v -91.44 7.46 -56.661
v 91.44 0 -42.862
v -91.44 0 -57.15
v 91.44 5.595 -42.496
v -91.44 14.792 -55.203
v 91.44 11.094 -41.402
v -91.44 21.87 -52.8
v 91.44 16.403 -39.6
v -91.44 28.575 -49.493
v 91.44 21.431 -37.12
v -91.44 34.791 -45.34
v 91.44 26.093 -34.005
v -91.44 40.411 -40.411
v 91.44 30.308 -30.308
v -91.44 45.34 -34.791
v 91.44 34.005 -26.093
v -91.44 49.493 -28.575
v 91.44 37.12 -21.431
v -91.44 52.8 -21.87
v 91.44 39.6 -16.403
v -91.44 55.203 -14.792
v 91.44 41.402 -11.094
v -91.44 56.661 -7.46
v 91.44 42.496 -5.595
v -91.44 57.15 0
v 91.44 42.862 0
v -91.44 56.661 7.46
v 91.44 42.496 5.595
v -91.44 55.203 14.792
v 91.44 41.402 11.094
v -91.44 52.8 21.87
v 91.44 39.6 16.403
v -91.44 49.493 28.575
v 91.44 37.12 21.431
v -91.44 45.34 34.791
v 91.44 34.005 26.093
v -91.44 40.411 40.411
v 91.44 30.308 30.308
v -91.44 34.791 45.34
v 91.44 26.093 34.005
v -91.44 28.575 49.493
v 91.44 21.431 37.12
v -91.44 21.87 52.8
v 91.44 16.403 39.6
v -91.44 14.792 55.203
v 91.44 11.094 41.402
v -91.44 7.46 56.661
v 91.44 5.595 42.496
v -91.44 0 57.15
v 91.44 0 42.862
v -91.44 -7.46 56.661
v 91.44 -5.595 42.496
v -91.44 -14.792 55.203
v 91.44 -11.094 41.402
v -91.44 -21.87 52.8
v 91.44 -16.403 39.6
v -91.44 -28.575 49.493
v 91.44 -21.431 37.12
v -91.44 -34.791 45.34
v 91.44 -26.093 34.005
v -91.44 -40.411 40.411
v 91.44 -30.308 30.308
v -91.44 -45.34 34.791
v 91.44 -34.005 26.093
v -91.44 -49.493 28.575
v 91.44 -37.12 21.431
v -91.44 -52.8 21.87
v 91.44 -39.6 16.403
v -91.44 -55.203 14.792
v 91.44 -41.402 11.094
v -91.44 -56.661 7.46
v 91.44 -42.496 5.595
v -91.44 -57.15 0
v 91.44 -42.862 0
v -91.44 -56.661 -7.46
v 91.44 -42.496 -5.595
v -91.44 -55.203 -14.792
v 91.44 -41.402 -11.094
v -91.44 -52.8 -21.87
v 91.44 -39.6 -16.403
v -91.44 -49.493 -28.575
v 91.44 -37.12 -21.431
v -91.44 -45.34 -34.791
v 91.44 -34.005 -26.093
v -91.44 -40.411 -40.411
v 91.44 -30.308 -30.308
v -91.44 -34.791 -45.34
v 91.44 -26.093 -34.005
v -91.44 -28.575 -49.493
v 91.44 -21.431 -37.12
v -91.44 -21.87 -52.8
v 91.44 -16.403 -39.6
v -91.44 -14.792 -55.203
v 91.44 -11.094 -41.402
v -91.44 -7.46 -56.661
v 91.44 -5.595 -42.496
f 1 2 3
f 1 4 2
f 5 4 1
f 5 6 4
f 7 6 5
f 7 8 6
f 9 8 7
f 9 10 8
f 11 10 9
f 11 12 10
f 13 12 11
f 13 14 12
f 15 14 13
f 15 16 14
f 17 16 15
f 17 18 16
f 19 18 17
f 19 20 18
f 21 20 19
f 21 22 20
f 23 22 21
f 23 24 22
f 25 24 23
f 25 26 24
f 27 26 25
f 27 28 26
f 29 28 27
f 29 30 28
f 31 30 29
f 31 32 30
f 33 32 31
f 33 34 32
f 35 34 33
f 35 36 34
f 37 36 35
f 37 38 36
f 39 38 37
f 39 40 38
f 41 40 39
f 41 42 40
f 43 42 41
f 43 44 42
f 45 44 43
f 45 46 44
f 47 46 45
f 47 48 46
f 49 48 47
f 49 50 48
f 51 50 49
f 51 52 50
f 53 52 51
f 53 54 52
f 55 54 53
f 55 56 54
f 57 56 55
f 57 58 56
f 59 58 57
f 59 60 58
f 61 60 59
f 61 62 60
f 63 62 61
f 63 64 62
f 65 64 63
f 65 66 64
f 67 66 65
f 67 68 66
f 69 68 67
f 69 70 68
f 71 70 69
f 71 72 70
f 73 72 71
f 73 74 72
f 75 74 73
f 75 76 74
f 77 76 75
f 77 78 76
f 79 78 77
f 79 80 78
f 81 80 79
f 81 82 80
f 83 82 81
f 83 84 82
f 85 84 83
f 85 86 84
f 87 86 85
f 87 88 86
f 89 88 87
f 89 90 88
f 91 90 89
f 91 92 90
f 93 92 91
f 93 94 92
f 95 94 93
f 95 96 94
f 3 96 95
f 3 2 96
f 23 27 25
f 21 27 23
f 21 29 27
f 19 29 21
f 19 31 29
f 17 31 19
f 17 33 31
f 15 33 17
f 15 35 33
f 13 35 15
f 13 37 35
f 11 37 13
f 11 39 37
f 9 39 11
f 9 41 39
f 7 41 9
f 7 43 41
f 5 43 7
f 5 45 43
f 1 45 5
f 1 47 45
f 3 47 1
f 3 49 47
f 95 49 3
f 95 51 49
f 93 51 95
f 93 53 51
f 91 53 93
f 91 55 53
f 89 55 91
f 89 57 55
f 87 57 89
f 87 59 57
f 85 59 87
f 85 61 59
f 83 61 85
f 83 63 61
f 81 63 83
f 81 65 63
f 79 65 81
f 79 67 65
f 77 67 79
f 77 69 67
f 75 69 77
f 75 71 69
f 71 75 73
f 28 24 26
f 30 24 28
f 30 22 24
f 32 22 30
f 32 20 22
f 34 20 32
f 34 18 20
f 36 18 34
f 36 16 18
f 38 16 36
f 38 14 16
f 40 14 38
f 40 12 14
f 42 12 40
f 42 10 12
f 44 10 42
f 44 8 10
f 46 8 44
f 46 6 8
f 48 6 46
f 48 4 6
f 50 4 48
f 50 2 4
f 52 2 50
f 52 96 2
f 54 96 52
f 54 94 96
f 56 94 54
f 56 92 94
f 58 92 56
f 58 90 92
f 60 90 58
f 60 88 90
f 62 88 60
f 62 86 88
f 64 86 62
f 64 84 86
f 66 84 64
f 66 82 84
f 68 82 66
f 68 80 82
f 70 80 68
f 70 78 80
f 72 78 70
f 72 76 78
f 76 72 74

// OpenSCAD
// Auto-generated by scripts/author_from_manifest.py (Phase D.3).
// Source: data/phase_d_manifest.json (sku_intent='anvil-concentric-reducer-threaded-4x3in').
// Do not hand-edit — regenerate from the manifest.
//
// @part anvil_concentric_reducer_threaded_4x3in
// @kind fitting
// @category fitting.reducer
// @display-name "Anvil FIG 7 Threaded Concentric Reducer 4x3\""
// @mfg anvil_international
// @mfg-pn FIG_7_4x3
// @listing UL FM
// @price-usd 22.00
// @install-minutes 6
// @crew journeyman
// @param size_in number default=4 label="Size" unit="in"
// @port inlet position=[-0.05,0,0] direction=[-1,0,0] style=grooved size_in=4 role=run_a
// @port outlet position=[0.05,0,0] direction=[1,0,0] style=grooved size_in=4 role=run_b

size_in = 4.0;

function od_mm(nps) =
    nps ==   1  ? 33.4 :
    nps == 1.25 ? 42.2 :
    nps == 1.5  ? 48.3 :
    nps ==   2  ? 60.3 :
    nps == 2.5  ? 73.0 :
    nps ==   3  ? 88.9 :
    nps ==   4  ? 114.3 :
    nps ==   6  ? 168.3 : 60.3;

od_big   = od_mm(size_in);
od_small = od_big * 0.75;
len_mm   = od_big * 1.6;

rotate([0, 90, 0])
    cylinder(h = len_mm, d1 = od_big, d2 = od_small, center = true, $fn = 48);
